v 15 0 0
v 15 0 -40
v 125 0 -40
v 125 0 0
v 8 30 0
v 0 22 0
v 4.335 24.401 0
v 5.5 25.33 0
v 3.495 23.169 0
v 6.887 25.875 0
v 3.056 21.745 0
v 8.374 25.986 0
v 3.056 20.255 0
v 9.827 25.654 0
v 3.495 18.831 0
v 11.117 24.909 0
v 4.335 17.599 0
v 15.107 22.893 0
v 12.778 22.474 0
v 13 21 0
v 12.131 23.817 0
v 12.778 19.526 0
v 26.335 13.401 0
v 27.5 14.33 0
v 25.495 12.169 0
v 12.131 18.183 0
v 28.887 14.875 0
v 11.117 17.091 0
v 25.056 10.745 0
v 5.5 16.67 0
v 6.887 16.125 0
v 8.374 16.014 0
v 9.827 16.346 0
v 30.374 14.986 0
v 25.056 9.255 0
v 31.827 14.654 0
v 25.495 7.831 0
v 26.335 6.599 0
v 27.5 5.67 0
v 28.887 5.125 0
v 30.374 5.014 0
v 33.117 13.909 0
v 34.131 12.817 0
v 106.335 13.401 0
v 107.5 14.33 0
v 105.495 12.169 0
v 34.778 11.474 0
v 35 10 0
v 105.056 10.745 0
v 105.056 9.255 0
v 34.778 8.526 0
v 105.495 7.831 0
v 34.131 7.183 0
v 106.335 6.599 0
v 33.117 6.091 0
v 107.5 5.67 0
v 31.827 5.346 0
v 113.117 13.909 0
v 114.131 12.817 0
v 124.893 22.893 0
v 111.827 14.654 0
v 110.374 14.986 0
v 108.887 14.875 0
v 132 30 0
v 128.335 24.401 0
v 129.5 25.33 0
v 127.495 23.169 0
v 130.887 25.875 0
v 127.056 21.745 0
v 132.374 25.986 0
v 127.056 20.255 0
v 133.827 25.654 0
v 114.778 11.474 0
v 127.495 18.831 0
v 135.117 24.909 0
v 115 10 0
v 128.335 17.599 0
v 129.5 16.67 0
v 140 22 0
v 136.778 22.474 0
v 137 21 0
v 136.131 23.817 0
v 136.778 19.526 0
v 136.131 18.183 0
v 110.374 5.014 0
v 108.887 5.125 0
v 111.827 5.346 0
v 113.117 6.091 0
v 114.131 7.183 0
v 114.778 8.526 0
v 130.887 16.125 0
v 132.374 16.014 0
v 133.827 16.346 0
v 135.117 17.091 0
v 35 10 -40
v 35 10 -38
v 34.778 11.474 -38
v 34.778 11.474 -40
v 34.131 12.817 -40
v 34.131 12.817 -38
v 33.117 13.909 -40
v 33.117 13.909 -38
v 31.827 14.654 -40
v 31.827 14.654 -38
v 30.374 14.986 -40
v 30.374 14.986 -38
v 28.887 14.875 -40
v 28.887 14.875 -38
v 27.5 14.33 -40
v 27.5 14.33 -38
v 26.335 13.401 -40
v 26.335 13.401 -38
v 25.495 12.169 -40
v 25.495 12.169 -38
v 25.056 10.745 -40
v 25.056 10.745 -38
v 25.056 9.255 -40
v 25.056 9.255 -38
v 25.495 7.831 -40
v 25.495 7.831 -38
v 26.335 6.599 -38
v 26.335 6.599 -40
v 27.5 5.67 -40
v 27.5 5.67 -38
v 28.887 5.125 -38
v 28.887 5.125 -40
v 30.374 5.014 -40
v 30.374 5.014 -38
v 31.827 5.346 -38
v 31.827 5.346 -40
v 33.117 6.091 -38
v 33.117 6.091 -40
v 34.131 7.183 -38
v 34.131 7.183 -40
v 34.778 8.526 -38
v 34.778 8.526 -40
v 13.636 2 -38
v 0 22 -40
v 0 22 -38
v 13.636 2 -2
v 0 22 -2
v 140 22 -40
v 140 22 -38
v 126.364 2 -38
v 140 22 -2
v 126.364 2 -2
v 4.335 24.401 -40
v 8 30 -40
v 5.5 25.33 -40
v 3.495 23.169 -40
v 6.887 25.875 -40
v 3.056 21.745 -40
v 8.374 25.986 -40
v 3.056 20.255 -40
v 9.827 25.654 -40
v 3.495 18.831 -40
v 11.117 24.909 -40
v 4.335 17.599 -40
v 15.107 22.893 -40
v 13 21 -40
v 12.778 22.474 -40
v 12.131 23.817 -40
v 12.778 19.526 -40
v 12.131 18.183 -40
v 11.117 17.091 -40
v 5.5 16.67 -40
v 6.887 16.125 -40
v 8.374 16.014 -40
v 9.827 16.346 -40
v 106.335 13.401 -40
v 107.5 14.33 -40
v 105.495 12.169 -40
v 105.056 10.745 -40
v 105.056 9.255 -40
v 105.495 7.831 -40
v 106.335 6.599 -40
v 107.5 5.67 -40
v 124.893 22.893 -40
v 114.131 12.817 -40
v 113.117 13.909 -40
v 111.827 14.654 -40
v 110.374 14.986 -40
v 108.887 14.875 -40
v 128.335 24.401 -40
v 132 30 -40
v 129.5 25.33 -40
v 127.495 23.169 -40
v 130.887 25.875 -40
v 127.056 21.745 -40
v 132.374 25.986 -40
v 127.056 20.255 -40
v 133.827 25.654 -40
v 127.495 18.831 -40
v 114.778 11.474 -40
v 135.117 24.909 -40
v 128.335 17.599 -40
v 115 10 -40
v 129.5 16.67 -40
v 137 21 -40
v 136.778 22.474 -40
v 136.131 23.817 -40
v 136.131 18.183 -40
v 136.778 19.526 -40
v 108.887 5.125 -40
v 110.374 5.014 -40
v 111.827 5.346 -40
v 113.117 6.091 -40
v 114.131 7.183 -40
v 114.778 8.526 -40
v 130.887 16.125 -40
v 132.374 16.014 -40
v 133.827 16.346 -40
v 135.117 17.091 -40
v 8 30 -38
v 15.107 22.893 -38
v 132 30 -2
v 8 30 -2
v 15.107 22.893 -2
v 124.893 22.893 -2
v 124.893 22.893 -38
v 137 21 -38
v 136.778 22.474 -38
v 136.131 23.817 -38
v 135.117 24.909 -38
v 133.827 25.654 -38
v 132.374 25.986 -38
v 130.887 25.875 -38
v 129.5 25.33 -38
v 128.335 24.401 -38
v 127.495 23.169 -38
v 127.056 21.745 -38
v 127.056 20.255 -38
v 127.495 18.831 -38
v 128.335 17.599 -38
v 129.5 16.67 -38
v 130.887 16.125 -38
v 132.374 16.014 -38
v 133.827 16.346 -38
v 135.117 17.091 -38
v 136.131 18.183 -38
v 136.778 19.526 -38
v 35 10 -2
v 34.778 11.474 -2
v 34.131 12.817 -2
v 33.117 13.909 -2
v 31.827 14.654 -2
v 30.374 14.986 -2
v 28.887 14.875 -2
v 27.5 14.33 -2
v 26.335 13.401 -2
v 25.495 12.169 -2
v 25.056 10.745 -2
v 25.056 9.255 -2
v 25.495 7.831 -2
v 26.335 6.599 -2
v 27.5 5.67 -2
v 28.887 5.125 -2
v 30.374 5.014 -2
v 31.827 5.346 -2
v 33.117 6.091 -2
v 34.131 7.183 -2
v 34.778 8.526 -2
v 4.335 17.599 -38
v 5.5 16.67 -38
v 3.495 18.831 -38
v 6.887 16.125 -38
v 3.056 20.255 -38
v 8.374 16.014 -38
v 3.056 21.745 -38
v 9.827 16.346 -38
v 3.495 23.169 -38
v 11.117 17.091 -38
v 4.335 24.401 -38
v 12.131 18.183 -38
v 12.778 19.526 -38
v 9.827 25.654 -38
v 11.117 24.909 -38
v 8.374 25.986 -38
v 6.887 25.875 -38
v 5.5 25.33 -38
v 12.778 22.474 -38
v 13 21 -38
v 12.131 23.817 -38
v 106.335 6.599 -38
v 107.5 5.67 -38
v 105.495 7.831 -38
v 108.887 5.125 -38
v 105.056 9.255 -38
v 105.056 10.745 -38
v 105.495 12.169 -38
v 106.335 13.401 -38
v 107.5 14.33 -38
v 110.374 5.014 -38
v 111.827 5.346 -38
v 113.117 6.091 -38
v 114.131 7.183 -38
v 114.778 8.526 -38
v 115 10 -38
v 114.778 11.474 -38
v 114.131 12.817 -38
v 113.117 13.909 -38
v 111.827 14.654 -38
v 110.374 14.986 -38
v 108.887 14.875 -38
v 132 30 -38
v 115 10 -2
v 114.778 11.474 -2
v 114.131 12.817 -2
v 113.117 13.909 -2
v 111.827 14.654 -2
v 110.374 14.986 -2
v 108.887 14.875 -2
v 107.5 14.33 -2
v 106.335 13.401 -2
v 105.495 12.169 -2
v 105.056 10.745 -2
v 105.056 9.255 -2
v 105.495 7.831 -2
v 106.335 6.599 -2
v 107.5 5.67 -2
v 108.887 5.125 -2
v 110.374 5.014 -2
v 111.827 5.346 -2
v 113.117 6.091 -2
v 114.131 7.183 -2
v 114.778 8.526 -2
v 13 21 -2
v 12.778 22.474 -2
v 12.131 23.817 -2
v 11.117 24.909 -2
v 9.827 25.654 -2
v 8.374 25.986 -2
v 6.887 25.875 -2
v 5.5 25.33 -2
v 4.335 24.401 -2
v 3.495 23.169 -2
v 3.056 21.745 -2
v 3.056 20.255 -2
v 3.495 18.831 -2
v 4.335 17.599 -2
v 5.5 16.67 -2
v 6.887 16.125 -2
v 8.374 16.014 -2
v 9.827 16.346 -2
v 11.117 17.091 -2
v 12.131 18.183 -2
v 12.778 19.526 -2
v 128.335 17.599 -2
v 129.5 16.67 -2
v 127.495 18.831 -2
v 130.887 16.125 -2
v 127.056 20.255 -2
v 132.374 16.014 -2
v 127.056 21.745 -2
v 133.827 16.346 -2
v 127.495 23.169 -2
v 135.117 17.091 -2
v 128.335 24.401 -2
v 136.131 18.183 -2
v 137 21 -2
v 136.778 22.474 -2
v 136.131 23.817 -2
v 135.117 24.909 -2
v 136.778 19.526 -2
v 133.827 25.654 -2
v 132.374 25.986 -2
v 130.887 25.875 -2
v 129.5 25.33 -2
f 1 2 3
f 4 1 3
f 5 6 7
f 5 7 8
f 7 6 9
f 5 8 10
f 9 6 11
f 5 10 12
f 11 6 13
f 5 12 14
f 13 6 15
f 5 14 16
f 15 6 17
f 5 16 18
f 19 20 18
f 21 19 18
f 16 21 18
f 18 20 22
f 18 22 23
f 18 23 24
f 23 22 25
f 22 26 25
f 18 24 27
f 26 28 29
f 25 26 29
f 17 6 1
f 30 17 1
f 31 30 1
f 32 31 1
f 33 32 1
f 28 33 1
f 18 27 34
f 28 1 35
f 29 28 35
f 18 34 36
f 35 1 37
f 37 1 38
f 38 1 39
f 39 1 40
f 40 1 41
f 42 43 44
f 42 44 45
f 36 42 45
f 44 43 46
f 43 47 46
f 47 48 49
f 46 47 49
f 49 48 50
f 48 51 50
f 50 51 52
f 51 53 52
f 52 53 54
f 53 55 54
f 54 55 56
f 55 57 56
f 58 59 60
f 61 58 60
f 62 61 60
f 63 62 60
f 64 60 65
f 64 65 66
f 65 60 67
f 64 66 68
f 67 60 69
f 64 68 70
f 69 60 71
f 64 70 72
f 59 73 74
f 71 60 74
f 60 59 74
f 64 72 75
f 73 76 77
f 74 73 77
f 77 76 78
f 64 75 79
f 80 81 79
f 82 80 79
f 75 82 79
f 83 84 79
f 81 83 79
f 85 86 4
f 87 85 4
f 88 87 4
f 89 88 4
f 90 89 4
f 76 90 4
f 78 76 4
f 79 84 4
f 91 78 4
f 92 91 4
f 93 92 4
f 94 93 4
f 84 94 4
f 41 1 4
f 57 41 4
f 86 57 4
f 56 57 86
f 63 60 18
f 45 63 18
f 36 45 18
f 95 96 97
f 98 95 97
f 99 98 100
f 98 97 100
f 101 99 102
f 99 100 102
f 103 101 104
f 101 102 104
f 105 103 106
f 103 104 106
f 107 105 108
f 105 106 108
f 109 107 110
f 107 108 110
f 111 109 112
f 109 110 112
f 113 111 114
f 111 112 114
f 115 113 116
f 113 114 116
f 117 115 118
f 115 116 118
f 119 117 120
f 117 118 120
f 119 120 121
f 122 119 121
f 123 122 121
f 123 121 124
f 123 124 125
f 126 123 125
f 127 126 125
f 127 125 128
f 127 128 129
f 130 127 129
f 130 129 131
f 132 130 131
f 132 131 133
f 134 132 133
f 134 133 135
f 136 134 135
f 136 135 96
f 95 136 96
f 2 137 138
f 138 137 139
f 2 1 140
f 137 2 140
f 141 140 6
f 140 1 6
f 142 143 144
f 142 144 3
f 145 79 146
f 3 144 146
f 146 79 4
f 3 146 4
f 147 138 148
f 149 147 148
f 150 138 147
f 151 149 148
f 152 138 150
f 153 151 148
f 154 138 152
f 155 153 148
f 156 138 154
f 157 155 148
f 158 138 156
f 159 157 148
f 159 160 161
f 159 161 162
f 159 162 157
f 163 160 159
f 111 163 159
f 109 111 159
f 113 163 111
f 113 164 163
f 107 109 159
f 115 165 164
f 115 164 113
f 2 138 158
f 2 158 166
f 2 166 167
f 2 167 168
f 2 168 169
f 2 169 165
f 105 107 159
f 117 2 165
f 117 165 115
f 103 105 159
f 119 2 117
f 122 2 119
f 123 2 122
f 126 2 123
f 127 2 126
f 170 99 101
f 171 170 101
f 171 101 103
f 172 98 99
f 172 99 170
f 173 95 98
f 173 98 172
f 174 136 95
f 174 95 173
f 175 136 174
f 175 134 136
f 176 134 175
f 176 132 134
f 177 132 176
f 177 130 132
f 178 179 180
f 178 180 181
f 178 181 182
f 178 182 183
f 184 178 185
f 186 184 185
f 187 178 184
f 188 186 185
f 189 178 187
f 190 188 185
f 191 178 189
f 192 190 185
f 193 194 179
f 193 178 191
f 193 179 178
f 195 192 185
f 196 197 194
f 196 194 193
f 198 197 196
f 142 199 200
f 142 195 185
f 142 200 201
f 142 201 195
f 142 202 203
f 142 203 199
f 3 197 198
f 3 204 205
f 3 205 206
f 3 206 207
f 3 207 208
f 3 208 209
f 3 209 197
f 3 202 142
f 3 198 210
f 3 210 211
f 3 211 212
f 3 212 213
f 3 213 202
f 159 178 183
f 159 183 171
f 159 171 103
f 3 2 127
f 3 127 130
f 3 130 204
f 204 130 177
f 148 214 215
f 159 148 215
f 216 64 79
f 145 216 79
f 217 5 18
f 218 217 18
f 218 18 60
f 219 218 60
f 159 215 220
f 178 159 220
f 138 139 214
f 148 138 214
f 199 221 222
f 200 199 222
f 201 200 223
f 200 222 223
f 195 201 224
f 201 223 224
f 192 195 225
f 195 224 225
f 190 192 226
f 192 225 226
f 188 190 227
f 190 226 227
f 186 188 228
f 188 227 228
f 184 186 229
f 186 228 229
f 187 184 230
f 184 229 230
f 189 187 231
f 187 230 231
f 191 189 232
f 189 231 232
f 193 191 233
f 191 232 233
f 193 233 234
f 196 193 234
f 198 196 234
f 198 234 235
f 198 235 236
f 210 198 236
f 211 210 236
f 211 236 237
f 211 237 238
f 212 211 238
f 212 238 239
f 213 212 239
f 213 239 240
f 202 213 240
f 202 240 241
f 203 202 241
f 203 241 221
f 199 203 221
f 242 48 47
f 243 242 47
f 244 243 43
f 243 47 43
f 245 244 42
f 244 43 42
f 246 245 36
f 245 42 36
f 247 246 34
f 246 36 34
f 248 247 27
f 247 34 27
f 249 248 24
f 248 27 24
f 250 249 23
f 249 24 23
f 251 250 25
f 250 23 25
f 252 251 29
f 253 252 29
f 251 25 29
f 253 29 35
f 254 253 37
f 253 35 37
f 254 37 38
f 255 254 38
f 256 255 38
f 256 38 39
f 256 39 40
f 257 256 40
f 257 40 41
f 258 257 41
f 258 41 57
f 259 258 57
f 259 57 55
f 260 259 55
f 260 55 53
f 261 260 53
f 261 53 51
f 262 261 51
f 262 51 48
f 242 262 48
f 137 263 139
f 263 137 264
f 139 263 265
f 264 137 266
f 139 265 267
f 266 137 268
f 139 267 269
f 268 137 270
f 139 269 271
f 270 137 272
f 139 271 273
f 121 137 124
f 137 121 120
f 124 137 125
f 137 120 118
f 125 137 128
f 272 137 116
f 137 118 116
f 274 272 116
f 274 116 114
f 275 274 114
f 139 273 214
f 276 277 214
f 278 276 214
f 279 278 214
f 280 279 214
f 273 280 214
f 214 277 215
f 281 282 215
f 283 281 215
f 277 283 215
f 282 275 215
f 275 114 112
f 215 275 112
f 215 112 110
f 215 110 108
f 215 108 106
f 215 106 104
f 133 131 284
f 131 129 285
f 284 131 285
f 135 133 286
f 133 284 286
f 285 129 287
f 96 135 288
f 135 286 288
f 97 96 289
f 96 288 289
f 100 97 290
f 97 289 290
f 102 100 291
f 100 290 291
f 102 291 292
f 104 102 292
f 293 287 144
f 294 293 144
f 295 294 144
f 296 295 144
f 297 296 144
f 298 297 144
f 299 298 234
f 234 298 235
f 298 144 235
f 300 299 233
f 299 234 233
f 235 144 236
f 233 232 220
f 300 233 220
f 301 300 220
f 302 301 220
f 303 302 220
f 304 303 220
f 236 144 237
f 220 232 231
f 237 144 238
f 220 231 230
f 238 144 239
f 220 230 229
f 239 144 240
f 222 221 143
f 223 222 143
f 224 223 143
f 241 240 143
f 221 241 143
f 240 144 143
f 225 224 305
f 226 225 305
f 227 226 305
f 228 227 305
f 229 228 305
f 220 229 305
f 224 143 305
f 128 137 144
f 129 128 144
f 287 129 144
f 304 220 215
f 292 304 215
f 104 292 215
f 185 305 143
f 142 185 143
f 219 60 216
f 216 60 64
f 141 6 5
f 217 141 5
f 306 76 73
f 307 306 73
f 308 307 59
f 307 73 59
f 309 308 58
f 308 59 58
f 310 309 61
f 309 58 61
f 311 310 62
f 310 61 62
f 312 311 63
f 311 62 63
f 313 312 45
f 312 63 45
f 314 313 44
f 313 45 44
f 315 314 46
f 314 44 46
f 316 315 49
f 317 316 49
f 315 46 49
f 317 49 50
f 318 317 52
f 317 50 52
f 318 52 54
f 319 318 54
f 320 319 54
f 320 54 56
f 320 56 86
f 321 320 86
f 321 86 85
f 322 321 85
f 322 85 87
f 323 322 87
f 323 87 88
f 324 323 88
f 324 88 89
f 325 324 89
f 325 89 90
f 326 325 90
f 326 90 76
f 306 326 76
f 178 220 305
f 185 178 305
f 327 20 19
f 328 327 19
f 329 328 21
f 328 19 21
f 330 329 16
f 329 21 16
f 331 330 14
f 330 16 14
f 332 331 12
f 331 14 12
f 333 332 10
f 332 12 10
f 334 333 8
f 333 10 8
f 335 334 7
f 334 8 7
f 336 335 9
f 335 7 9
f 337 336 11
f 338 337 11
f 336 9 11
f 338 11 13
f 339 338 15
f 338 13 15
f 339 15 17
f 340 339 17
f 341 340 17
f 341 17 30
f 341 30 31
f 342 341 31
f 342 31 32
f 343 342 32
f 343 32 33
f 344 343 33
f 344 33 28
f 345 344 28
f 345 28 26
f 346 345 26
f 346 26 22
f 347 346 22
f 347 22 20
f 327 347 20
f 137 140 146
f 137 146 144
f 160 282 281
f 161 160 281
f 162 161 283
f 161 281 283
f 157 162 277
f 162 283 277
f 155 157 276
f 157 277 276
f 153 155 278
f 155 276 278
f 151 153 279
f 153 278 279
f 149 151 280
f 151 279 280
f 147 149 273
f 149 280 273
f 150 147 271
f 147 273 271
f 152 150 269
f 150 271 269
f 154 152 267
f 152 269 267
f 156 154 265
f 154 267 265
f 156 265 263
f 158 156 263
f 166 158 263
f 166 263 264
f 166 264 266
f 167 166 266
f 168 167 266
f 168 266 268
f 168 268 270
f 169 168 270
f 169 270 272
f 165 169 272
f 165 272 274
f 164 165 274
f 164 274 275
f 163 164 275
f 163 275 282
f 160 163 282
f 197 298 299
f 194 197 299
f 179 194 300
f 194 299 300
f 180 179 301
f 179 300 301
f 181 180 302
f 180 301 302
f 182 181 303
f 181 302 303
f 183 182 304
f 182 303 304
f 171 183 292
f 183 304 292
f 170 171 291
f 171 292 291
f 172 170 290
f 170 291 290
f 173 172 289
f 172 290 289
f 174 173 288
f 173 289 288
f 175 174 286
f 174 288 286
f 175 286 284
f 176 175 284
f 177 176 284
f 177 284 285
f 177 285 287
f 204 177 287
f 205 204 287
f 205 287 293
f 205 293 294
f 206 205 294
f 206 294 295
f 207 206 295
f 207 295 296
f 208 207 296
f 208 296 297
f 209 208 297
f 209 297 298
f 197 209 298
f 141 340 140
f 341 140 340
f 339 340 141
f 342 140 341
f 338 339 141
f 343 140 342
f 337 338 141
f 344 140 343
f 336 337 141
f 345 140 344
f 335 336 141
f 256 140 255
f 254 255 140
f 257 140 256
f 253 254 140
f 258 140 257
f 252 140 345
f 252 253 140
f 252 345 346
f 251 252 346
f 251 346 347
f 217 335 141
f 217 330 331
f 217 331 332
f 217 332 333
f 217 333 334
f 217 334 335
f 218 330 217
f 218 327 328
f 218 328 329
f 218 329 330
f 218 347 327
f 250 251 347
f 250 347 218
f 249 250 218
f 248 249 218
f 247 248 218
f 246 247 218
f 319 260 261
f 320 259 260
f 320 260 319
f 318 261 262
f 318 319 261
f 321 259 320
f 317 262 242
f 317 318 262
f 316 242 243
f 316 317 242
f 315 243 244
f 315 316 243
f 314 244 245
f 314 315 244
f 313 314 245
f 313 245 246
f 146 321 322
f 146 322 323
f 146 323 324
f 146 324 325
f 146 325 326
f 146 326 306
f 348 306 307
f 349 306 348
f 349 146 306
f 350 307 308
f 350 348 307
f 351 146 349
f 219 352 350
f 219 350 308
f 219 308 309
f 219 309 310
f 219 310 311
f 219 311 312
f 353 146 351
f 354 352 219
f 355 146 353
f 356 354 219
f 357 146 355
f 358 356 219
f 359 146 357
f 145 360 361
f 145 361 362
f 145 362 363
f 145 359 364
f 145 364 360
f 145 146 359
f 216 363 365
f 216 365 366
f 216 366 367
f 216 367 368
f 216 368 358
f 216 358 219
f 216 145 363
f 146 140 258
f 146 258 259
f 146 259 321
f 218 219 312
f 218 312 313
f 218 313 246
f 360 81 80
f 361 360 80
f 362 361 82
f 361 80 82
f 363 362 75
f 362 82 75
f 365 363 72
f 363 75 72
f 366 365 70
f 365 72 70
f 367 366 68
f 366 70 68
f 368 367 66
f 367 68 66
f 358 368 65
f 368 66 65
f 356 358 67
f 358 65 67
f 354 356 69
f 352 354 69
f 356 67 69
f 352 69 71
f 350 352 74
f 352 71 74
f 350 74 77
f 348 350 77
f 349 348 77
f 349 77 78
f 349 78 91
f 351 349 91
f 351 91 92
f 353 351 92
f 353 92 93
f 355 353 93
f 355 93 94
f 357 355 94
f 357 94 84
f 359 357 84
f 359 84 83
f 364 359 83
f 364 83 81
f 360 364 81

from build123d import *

# Parameters (mm, degrees)
SKETCH1_W           = 140
SKETCH1_H           = 40
BOSS_EXTRUDE1_DEPTH = 30
SKETCH2_W           = 36
SKETCH2_H           = 28
CUT_EXTRUDE1_DEPTH  = 149.660687473
CUT_EXTRUDE2_DEPTH  = 149.660687473
CUT_EXTRUDE3_DEPTH  = 149.660687473
SKETCH6_R           = 5
CUT_EXTRUDE6_DEPTH  = 149.660687473


with BuildPart() as part:
    # Sketch1 → Boss-Extrude1 (new body)
    with BuildSketch(Plane(origin=(0, 0, 0), x_dir=(1, 0, 0), z_dir=(0, 1, 0))):
        with Locations((70, 20)):
            Rectangle(SKETCH1_W, SKETCH1_H)
    extrude(amount=BOSS_EXTRUDE1_DEPTH)

    # Sketch2 → Cut-Extrude1 (cut, through all)
    with BuildSketch(Plane(origin=(140, 0, 0), x_dir=(0, 0, -1), z_dir=(1, 0, 0))):
        with Locations((20, 16)):
            Rectangle(SKETCH2_W, SKETCH2_H)
    extrude(amount=-CUT_EXTRUDE1_DEPTH, mode=Mode.SUBTRACT)

    # Sketch3 → Cut-Extrude2 (cut, through all)
    with BuildSketch(Plane.XY):
        Polygon((0, 0), (15, 0), (0, 22), align=None)
        Polygon((140, 22), (125, 0), (140, 0), align=None)
    extrude(amount=-CUT_EXTRUDE2_DEPTH, mode=Mode.SUBTRACT)

    # Sketch5 → Cut-Extrude3 (cut, through all)
    with BuildSketch(Plane.XY):
        Polygon((0, 30), (0, 22), (8, 30), align=None)
        Polygon((140, 30), (132, 30), (140, 22), align=None)
    extrude(amount=-CUT_EXTRUDE3_DEPTH, mode=Mode.SUBTRACT)

    # Sketch6 → Cut-Extrude6 (cut, through all)
    with BuildSketch(Plane.XY):
        Polygon((70, 30), (8, 30), (15.107268728, 22.892731272), (70, 22.892731272), align=None)
        Polygon((132, 30), (70, 30), (70, 22.892731272), (124.892731272, 22.892731272), align=None)
        with Locations((132, 21)):
            Circle(SKETCH6_R)
        with Locations((110, 10)):
            Circle(SKETCH6_R)
        with Locations((30, 10)):
            Circle(SKETCH6_R)
        with Locations((8, 21)):
            Circle(SKETCH6_R)
    extrude(amount=-CUT_EXTRUDE6_DEPTH, mode=Mode.SUBTRACT)


solid = part.part
